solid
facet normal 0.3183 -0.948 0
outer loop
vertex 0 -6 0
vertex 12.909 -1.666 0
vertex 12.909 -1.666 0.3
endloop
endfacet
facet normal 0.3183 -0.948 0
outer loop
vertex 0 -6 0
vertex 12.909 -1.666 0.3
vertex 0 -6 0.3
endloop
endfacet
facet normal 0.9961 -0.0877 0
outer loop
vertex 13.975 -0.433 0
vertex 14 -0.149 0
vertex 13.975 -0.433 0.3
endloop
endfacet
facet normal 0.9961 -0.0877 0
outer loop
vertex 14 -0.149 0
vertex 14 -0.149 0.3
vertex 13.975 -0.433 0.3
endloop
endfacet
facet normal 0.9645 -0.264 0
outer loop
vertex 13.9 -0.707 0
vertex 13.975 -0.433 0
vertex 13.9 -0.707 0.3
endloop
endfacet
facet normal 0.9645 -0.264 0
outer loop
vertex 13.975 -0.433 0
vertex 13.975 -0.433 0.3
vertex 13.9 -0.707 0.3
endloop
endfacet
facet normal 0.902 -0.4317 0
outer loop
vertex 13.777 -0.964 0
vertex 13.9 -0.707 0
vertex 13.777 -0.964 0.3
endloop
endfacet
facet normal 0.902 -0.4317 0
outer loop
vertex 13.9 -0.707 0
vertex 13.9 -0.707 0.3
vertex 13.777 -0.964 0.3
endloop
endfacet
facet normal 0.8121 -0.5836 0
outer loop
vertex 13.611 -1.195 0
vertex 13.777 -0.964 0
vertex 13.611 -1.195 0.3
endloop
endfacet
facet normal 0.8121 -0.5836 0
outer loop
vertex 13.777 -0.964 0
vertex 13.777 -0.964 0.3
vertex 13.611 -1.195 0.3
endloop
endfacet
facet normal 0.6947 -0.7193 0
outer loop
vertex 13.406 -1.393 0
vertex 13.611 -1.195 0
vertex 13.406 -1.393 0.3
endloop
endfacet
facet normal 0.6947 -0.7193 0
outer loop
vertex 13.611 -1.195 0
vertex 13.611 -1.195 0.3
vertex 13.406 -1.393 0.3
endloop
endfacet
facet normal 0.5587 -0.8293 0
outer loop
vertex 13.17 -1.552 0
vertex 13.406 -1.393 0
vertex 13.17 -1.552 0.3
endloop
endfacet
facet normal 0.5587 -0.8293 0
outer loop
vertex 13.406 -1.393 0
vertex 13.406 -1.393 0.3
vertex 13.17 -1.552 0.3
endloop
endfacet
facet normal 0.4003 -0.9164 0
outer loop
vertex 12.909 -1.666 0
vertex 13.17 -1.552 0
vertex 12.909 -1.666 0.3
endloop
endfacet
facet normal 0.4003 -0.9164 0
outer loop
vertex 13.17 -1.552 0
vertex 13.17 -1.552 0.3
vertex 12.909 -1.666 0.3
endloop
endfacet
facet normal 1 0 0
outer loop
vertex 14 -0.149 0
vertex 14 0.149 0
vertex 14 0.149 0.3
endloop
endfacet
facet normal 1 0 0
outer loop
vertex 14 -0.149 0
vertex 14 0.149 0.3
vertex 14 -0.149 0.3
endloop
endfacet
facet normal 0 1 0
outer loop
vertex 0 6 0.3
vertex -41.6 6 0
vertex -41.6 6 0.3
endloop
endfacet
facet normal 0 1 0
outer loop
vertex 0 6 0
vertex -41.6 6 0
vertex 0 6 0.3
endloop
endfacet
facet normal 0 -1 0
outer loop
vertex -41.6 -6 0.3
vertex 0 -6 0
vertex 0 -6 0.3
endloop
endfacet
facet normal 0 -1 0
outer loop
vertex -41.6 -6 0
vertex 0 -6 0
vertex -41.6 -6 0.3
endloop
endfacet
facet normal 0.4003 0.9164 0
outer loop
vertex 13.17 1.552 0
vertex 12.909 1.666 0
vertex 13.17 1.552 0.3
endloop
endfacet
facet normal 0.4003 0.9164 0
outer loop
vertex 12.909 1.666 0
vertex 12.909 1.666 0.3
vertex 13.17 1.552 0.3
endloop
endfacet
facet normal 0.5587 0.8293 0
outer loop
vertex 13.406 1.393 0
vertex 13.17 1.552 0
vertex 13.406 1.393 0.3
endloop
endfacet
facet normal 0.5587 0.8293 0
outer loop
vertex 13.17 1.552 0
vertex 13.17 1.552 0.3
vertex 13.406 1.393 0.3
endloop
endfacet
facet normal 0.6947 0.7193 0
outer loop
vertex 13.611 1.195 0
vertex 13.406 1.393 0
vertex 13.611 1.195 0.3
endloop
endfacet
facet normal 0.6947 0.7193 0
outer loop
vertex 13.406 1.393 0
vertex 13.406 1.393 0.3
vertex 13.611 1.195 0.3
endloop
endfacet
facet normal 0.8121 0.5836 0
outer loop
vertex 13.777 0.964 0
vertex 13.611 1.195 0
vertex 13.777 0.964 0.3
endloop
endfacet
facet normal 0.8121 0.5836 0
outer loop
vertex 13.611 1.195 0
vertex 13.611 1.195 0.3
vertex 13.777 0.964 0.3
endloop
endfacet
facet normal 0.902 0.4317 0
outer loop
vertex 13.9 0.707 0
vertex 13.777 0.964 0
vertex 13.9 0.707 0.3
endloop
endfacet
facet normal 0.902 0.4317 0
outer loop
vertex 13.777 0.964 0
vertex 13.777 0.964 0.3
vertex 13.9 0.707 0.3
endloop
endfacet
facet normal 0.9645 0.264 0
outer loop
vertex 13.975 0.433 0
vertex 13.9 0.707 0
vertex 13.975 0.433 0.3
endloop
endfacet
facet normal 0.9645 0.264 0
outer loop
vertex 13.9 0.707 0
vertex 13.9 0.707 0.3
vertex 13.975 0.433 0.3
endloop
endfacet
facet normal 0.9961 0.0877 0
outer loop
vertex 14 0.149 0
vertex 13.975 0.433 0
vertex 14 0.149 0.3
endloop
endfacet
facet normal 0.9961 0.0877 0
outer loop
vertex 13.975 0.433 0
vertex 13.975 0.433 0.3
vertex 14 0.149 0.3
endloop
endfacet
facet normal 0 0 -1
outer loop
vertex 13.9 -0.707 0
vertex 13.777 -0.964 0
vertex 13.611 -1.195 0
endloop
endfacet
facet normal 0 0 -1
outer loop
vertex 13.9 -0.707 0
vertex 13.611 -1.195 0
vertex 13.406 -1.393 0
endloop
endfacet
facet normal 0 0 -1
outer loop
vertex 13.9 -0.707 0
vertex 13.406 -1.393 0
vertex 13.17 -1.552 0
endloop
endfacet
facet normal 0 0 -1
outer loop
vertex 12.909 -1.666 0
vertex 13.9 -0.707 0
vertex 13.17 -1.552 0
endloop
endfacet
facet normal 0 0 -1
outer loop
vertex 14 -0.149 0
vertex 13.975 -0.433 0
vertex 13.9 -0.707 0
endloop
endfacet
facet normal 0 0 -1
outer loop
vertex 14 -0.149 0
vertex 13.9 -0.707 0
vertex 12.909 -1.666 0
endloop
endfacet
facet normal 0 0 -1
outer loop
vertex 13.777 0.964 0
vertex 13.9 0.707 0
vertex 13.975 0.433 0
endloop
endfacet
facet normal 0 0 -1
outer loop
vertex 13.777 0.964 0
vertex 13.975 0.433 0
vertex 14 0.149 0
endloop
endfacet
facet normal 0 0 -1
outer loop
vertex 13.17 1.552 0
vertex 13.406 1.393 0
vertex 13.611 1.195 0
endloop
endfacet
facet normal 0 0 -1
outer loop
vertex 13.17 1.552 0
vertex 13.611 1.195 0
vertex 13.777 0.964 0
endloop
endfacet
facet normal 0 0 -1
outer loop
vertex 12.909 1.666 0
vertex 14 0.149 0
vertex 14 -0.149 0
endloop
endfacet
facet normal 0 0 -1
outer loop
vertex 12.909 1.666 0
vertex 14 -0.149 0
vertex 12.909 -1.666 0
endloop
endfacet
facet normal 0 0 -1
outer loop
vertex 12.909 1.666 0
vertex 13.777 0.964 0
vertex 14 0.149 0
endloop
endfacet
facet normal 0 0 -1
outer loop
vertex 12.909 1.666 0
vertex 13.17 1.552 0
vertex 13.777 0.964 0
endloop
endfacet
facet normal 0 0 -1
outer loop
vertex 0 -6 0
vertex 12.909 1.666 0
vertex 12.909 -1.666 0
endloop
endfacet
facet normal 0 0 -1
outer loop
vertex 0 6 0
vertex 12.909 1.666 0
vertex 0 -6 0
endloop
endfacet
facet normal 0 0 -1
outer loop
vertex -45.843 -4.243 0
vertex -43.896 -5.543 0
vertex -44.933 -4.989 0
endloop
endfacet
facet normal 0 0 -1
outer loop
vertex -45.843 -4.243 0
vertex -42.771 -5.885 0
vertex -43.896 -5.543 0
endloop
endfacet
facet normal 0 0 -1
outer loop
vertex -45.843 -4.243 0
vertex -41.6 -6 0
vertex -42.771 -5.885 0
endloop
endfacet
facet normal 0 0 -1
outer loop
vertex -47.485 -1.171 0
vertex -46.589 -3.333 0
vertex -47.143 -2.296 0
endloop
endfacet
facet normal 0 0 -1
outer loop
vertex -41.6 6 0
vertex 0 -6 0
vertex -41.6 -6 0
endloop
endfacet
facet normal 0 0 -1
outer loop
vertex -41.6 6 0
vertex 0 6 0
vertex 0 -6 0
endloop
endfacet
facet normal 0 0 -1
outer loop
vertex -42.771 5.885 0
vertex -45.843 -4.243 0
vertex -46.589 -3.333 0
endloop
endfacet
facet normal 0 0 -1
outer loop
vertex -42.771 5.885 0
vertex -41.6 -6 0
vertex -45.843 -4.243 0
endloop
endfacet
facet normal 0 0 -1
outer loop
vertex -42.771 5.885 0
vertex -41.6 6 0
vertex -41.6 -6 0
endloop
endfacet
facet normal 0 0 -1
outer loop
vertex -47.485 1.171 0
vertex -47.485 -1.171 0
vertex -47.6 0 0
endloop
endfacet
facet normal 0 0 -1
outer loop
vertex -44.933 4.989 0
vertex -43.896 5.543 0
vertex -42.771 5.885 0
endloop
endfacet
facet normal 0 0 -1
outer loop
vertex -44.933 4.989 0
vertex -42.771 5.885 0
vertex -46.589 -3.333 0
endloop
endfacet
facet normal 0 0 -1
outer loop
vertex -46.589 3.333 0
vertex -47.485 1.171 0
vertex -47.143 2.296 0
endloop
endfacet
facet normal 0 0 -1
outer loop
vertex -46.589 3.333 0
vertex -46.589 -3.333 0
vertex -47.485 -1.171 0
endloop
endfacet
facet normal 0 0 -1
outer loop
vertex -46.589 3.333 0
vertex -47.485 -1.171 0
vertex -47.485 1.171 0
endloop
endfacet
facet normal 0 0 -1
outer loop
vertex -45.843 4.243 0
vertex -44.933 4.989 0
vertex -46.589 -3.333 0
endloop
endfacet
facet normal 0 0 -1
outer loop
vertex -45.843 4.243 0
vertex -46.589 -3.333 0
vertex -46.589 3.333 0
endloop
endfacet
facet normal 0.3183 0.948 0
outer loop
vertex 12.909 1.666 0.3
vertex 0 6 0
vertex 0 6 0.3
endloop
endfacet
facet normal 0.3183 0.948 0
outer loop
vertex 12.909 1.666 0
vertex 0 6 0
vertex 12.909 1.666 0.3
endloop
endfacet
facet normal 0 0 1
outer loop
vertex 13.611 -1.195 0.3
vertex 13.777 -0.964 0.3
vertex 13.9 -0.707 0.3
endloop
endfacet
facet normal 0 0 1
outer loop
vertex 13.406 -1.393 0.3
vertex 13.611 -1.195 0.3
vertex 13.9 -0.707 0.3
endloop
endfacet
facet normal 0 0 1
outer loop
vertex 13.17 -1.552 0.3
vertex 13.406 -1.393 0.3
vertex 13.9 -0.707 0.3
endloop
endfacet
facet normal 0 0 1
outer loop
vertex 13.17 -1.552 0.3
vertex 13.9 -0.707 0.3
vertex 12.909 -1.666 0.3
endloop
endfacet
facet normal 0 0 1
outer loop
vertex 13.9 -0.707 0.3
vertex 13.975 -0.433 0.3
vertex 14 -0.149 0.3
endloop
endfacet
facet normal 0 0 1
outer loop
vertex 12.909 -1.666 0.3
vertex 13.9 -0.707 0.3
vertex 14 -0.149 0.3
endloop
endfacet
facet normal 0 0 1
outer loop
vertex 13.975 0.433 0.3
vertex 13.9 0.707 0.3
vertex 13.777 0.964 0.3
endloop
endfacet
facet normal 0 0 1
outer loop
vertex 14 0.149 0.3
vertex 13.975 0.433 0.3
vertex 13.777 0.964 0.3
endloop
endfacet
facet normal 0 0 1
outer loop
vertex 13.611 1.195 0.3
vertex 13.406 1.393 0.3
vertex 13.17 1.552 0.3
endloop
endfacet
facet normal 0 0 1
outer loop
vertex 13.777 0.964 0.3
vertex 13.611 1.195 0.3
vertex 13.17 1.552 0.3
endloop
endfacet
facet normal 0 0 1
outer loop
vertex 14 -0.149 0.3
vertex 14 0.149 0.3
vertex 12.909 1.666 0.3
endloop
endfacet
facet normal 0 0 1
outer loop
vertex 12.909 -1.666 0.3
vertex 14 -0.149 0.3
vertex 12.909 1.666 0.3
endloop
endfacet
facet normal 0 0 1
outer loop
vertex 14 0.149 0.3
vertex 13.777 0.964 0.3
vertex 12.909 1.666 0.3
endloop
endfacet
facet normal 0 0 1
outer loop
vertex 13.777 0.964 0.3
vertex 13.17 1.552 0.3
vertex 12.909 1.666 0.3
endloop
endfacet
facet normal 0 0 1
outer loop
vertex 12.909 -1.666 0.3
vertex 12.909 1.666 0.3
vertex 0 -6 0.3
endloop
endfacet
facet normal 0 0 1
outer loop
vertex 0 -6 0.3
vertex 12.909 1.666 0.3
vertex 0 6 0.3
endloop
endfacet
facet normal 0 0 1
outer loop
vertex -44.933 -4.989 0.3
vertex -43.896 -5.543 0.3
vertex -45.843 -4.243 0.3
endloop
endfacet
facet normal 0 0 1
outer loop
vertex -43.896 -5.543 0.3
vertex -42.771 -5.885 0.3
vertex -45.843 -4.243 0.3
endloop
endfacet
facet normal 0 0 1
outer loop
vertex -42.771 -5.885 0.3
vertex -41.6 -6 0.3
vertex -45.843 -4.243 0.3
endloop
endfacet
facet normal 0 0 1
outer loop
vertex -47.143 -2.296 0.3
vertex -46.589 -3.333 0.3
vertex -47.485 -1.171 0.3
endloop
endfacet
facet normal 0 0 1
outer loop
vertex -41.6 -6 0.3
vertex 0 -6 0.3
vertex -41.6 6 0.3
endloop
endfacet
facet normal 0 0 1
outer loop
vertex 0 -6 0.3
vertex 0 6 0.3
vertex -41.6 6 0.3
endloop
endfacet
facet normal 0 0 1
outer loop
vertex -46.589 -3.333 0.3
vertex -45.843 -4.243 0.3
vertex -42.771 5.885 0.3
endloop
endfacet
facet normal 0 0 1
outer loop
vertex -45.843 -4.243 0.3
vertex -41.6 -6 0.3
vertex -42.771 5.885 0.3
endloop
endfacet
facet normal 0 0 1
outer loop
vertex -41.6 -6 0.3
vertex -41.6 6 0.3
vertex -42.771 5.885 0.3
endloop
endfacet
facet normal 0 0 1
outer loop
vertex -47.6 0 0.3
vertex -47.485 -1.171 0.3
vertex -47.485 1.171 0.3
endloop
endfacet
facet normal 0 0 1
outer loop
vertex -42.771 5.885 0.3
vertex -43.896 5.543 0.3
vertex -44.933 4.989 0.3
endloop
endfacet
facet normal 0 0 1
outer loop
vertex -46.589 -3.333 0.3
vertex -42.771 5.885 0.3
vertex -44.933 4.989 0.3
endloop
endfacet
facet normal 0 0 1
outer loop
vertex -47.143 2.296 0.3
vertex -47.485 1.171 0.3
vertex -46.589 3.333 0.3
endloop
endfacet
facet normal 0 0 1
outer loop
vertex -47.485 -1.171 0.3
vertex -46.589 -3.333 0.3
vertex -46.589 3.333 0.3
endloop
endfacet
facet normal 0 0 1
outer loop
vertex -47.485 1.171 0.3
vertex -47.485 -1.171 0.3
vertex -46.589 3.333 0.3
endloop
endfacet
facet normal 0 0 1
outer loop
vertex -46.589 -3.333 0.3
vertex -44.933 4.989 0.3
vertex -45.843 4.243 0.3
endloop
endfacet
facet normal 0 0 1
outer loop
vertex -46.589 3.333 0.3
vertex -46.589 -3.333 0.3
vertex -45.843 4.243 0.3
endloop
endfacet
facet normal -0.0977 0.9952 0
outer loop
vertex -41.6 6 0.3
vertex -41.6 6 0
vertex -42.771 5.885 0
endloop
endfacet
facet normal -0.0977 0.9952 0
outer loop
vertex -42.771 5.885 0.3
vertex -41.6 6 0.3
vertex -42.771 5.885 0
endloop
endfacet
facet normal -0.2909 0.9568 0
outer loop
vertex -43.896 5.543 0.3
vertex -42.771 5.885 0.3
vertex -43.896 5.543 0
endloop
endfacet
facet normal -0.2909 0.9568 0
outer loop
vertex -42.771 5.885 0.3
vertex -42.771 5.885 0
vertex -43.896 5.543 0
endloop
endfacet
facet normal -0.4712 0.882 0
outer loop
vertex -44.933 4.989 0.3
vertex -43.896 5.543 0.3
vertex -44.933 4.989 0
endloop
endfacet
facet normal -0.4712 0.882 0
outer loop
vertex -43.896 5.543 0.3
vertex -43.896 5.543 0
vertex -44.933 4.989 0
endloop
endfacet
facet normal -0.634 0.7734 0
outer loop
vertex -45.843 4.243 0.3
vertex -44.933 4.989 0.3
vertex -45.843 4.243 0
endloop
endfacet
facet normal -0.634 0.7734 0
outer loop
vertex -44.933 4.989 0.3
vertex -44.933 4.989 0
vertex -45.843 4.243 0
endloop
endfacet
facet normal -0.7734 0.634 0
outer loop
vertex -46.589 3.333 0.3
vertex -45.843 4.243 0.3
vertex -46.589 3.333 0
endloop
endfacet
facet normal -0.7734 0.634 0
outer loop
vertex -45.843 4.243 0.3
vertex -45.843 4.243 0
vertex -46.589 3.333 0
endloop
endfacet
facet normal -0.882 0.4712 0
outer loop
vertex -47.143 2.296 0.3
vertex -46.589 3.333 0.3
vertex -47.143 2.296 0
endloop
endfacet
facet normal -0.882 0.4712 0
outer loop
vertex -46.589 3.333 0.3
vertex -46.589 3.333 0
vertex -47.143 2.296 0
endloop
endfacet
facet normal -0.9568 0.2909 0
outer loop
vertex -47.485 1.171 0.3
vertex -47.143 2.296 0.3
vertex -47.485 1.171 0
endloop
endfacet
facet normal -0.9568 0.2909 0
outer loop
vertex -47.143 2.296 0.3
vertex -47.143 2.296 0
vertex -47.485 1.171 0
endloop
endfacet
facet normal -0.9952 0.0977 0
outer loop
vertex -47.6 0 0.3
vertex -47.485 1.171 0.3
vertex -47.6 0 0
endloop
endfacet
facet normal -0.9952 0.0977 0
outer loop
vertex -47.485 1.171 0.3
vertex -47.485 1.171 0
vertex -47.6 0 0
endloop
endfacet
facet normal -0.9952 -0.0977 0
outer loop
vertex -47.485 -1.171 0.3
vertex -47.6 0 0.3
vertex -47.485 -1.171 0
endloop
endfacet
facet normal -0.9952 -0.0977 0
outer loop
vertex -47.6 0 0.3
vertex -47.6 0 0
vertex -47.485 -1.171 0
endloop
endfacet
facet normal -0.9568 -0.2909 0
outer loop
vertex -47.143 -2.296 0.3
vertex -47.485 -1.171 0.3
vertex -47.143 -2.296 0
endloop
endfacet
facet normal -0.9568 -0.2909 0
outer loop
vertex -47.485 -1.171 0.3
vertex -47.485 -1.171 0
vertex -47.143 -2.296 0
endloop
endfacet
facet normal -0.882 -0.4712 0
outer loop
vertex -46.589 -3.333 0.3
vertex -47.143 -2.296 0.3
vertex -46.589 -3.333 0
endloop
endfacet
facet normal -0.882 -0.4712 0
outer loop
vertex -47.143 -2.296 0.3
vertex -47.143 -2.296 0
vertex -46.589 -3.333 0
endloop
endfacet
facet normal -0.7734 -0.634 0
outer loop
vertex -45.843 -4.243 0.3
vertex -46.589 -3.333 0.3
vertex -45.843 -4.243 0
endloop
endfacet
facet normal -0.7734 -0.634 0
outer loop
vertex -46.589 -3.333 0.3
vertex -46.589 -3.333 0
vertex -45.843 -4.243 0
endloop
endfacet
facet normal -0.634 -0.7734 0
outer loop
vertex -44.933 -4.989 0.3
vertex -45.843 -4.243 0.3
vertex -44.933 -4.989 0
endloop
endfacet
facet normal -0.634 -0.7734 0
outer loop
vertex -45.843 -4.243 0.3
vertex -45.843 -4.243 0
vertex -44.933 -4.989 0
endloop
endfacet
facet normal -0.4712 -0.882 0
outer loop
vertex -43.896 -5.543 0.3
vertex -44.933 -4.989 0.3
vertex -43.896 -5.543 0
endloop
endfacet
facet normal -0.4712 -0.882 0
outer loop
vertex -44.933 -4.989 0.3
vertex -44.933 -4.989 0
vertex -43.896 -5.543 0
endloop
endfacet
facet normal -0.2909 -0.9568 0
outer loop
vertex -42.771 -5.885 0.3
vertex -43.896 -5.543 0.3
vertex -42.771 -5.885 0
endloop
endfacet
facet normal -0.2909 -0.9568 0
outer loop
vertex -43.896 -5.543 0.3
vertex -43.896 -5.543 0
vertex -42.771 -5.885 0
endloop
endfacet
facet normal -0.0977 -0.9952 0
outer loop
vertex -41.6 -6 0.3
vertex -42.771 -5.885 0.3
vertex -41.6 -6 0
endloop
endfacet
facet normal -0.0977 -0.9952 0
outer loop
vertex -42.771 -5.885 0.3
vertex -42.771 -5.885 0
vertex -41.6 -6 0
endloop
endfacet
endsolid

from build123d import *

# Parameters (mm, degrees)
PAD_DEPTH = 0.3
FILLET_R  = 1.6


with BuildPart() as part:
    # Sketch → Pad (new body)
    with BuildSketch(Plane.XY):
        with BuildLine():
            Line((-41.6, 6), (0, 6))
            Line((0, 6), (14, 1.3))
            Line((14, 1.3), (14, -1.3))
            Line((14, -1.3), (0, -6))
            Line((0, -6), (-41.6, -6))
            ThreePointArc((-41.6, 6), (-47.600033, 0), (-41.6, -6))
        make_face()
    extrude(amount=PAD_DEPTH)

    # Fillet
    fillet_edges = [part.edges().sort_by_distance(p)[0] for p in [
        (14, -1.3, 0.15),
        (14, 1.3, 0.15),
    ]]
    fillet(fillet_edges, radius=FILLET_R)


solid = part.part
